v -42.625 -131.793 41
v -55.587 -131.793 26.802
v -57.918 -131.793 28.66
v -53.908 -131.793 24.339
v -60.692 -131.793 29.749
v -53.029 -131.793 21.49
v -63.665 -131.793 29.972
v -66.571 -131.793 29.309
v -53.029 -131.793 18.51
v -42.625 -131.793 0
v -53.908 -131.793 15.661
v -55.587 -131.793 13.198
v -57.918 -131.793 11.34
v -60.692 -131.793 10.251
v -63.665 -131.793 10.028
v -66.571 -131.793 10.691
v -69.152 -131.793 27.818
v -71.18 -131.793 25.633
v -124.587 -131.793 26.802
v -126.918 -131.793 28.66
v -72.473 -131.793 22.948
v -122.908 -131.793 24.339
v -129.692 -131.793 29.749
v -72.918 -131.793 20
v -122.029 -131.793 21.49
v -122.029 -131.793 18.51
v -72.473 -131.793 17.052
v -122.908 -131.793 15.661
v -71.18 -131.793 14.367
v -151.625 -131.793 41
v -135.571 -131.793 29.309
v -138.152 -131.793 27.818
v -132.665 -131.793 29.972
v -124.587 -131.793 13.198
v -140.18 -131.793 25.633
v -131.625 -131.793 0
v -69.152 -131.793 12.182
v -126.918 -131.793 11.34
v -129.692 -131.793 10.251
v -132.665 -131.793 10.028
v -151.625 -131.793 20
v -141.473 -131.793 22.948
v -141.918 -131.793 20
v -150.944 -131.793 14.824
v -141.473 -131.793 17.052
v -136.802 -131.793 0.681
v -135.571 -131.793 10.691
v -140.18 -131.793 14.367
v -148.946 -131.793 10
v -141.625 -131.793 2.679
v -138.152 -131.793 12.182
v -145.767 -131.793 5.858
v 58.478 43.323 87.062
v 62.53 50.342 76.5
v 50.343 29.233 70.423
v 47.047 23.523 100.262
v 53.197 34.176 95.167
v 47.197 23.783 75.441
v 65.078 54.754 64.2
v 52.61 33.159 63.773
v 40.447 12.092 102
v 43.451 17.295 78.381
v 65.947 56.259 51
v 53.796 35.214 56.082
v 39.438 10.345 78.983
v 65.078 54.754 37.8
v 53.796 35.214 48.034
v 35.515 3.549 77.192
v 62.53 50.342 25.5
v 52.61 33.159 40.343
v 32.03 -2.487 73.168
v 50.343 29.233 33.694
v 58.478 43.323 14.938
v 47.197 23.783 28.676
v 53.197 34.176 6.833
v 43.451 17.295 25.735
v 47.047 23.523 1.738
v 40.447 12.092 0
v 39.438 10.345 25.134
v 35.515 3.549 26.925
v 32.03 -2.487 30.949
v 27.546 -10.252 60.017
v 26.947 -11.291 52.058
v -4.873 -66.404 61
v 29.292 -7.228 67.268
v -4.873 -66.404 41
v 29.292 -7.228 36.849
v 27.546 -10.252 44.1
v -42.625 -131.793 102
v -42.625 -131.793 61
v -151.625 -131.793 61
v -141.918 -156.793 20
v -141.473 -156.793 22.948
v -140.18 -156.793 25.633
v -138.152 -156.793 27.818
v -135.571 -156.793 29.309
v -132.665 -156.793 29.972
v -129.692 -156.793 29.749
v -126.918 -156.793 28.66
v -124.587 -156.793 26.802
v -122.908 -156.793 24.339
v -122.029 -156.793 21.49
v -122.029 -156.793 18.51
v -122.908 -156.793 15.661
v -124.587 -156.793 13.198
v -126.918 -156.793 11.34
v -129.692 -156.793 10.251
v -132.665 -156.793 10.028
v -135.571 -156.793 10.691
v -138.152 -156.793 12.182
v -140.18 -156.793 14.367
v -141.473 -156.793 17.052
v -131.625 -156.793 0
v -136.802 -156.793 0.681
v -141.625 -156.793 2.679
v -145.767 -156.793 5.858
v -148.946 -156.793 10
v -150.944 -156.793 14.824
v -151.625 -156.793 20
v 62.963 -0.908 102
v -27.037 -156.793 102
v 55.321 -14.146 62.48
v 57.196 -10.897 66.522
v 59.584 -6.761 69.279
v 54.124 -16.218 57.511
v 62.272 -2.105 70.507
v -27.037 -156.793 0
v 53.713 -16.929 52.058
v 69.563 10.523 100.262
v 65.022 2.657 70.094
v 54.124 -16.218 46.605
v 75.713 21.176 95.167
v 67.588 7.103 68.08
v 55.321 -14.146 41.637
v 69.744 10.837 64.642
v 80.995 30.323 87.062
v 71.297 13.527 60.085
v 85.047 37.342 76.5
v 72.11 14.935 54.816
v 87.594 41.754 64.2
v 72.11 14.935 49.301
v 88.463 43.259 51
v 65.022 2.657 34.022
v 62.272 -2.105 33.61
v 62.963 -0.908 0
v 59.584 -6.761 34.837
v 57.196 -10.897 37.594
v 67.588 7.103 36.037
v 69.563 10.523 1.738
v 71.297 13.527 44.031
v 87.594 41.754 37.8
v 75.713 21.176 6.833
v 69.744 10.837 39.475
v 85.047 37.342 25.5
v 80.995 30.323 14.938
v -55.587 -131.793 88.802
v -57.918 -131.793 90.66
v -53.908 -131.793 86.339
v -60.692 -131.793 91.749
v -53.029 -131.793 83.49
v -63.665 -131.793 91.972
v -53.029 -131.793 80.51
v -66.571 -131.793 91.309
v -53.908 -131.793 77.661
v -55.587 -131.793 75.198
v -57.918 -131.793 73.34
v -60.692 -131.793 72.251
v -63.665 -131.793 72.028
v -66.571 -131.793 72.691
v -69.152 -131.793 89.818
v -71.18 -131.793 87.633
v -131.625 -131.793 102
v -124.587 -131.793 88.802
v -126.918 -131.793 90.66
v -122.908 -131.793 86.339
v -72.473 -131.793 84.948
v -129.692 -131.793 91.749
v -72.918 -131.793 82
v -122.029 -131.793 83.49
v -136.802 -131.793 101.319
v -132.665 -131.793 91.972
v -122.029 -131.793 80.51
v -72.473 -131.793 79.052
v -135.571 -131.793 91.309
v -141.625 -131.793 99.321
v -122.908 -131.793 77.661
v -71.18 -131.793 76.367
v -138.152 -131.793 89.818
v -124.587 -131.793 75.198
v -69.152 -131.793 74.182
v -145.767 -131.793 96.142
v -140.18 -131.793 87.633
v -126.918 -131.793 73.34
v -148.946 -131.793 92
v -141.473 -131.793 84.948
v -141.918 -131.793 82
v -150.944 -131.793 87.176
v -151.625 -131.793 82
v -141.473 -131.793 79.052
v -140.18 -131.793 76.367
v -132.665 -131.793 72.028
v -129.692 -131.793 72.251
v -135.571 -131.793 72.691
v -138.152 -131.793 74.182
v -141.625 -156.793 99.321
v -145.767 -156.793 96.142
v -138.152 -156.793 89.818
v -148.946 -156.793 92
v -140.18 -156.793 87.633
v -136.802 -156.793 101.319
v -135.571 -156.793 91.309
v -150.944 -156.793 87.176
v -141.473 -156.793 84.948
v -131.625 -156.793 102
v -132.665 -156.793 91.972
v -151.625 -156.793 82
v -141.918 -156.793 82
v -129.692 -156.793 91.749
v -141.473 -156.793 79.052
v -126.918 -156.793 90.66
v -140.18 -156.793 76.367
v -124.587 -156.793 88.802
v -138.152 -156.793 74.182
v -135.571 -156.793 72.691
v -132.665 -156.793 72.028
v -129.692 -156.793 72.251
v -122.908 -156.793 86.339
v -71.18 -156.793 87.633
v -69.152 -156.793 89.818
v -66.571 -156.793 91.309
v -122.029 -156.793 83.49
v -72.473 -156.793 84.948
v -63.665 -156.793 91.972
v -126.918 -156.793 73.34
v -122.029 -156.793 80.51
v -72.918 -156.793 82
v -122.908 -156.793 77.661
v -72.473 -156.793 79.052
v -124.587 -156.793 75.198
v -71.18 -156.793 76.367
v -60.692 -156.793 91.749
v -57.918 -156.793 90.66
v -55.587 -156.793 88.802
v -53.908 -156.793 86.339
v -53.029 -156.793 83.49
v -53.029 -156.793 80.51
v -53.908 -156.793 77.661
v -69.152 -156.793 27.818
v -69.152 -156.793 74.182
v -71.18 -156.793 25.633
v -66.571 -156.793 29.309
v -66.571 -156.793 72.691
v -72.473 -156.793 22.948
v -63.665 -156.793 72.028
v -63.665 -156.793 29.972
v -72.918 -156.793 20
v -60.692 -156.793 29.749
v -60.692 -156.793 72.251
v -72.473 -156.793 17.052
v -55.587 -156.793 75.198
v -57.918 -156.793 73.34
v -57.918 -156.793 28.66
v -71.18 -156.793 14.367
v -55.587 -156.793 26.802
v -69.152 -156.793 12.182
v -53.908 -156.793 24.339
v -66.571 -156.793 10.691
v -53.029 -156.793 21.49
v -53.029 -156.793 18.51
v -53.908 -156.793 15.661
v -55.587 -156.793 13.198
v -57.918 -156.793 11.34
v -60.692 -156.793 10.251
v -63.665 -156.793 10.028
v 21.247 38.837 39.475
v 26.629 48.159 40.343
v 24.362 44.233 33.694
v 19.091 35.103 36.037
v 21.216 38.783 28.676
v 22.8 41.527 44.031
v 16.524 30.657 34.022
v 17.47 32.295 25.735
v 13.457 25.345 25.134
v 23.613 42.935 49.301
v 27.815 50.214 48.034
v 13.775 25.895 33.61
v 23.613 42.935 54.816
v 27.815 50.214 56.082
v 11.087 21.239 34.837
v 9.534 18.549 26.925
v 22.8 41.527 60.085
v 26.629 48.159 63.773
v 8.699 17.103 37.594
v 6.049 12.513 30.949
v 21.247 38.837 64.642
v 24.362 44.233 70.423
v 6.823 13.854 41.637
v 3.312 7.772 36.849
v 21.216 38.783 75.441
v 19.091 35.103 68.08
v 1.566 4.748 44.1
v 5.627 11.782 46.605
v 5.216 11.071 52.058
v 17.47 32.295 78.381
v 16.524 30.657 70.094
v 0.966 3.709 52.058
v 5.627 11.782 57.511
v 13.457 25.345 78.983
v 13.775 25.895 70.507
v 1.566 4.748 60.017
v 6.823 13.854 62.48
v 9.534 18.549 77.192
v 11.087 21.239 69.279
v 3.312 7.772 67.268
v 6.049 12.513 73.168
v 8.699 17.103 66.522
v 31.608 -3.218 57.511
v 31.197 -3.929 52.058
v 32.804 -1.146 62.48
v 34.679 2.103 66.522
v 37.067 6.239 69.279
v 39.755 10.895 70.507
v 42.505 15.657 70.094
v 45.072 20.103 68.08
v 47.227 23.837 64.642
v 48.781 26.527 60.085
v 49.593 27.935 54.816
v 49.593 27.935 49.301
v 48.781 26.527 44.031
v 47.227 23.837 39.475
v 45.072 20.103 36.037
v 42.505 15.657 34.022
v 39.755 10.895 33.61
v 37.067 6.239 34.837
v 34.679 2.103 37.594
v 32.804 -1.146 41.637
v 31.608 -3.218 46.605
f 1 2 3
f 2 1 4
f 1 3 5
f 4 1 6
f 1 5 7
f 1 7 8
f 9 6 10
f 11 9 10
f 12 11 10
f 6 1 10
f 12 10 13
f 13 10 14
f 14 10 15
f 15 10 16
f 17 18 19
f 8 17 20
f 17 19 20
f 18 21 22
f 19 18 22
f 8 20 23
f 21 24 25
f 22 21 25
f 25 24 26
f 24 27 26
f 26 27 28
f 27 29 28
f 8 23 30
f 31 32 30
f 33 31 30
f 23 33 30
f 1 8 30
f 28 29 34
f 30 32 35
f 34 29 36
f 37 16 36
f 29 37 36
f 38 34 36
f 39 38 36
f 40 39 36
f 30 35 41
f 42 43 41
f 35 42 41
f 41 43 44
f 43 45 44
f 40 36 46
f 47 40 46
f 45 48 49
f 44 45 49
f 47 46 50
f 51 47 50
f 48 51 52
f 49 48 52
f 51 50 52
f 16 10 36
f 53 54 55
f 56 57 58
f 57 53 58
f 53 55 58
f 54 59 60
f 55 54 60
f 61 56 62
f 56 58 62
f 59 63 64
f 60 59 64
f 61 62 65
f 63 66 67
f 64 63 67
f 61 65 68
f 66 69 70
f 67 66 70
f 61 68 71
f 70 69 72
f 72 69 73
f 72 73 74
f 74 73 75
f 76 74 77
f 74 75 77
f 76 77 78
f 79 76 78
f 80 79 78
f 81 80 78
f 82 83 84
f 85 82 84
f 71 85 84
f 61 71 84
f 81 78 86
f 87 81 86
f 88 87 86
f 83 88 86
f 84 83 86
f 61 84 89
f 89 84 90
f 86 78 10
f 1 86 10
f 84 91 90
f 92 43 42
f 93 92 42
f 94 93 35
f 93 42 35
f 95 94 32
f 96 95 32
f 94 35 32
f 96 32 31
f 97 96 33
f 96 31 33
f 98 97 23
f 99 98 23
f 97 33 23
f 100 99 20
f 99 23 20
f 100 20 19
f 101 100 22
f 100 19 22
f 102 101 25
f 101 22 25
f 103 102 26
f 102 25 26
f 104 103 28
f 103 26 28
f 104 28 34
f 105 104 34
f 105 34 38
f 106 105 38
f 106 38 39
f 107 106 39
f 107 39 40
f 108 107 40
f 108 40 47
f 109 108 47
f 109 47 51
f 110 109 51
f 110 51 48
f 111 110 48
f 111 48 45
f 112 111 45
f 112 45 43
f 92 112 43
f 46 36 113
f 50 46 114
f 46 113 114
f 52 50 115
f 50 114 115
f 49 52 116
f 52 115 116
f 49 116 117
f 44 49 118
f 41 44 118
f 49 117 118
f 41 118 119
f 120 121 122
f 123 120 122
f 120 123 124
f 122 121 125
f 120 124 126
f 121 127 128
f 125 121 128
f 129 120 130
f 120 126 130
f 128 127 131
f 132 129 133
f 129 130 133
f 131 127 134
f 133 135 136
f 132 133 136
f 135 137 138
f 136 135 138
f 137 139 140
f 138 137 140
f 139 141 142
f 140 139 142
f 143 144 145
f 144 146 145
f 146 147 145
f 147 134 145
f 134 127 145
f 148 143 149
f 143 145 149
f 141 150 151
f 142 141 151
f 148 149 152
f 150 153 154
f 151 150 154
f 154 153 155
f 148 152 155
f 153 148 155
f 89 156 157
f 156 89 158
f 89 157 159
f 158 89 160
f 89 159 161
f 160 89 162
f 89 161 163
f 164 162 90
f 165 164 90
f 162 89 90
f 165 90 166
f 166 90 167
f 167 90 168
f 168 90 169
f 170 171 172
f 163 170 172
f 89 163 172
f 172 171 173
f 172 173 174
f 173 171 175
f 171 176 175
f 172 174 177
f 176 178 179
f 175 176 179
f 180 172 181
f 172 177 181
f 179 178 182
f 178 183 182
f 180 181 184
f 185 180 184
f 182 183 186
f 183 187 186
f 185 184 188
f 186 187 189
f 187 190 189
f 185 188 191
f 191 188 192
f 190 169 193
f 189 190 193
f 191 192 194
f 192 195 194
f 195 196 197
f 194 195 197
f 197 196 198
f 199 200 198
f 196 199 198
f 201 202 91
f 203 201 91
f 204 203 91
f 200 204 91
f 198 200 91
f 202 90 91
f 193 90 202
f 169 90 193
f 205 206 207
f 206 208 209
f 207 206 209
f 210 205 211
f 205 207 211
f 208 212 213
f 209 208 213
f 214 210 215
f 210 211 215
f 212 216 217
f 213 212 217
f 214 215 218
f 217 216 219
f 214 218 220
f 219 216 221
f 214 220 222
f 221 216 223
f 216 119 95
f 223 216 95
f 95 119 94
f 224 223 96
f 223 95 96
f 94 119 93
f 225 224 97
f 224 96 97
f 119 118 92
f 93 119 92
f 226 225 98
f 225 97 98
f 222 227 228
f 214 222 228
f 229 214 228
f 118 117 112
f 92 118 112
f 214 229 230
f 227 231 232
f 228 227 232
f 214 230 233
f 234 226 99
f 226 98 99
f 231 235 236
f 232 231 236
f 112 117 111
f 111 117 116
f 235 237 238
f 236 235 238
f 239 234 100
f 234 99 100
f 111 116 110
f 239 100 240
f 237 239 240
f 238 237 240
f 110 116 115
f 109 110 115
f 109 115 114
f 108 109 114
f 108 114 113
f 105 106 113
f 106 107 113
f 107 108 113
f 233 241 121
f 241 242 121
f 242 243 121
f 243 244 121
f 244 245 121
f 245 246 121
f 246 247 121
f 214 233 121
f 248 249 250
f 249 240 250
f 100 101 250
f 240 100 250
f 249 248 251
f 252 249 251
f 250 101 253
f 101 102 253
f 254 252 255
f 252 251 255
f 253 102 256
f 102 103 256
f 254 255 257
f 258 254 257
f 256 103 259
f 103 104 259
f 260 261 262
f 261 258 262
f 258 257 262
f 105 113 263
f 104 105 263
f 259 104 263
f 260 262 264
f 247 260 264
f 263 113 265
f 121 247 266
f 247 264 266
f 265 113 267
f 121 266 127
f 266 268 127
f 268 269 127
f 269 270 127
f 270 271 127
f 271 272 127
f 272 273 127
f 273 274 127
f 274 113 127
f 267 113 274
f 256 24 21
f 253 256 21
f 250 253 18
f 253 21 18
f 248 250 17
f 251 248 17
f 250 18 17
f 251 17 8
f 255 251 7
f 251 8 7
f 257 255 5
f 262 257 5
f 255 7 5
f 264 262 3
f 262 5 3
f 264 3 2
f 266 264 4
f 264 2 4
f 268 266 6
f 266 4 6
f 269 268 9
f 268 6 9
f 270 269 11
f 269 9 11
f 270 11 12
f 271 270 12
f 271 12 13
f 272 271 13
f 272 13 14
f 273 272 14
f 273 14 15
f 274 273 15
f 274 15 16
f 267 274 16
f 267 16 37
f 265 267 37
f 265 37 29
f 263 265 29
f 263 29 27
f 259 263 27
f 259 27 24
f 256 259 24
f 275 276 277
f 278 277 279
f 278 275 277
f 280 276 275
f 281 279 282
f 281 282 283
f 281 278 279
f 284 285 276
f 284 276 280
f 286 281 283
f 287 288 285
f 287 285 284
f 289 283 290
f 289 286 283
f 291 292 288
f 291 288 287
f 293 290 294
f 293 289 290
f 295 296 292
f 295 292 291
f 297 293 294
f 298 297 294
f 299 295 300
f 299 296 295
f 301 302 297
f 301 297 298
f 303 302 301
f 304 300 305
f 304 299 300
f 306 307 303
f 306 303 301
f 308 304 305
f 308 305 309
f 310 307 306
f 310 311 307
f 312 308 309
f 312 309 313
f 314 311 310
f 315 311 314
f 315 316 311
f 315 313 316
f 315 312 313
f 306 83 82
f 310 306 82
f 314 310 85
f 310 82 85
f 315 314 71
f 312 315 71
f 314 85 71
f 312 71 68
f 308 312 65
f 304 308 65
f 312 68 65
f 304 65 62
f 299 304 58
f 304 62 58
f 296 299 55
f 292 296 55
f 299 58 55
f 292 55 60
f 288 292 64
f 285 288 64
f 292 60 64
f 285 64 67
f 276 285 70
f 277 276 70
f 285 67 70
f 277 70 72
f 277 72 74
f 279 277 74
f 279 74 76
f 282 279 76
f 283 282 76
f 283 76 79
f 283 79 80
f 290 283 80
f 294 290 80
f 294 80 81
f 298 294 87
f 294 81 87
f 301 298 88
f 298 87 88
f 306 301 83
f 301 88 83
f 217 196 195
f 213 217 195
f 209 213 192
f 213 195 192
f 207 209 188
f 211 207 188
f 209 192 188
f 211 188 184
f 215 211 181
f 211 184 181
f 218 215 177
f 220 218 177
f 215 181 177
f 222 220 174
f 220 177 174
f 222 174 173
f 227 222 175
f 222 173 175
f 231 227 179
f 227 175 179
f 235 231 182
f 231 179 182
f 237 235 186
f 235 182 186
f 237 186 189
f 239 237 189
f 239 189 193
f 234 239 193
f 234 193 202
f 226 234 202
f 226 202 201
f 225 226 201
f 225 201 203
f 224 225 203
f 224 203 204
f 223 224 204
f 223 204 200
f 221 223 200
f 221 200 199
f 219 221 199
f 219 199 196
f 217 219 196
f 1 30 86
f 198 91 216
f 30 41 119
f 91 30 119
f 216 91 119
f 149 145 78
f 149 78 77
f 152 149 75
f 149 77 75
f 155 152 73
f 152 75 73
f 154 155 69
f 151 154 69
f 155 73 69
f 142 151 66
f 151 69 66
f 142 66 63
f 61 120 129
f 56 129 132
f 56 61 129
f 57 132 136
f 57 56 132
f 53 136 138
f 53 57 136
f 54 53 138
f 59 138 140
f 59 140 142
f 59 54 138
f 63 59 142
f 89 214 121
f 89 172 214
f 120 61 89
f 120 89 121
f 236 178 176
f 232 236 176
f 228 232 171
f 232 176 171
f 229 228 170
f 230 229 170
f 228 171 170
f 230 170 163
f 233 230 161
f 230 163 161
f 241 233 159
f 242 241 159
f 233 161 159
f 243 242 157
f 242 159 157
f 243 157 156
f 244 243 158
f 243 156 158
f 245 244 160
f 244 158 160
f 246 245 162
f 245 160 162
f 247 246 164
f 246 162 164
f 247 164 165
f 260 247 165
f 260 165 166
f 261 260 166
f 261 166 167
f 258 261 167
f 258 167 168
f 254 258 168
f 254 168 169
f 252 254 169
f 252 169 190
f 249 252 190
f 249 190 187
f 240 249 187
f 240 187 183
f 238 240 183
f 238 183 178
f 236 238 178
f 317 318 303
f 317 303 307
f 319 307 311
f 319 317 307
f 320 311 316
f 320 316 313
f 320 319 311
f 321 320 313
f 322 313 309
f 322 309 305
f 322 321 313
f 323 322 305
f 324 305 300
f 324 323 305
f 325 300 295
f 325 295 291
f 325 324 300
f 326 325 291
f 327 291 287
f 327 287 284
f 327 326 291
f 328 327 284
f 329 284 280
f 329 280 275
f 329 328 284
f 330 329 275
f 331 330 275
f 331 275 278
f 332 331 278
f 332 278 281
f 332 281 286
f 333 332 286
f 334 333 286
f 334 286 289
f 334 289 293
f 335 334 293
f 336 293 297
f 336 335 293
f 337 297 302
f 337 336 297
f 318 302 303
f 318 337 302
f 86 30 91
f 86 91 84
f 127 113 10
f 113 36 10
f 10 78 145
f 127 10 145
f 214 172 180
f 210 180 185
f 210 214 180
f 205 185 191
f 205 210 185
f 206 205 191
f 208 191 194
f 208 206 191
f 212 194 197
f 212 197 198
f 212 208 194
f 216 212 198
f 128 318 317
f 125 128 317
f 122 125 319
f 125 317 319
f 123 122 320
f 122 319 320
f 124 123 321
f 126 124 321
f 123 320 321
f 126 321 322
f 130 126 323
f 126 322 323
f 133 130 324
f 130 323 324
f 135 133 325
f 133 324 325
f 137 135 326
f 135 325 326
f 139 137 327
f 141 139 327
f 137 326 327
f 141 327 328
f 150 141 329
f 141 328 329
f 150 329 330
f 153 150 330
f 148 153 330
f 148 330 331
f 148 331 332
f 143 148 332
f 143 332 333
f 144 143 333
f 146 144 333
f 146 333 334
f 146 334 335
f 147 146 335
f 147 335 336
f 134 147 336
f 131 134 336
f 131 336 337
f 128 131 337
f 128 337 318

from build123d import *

# Parameters (mm, degrees)
F1_DEPTH  = 102
F2_R      = 27
F2_R_2    = 18.5
F3_DEPTH  = 30
F4_R      = 10
F5_DEPTH  = 50
F6_R      = 50.99999
F9_DEPTH  = 10
F10_R     = 18.5
F11_DEPTH = 30
F12_R     = 20


# Not quite as in the source:
# - a fillet or chamfer is up to 0.001 mm smaller than in the source, because OpenCascade refuses the exact size


with BuildPart() as f1:
    # F0 (on Top) → F1 (new body)
    with BuildSketch(Plane.XY):
        Polygon((-151.6251202653, -131.7925444834), (-151.6251202653, -156.7925444834), (-27.0366629971, -156.7925444834), (88.4633370029, 43.2593237909), (65.9466765045, 56.2593237909), (-42.6251202653, -131.7925444834), align=None)
    extrude(amount=F1_DEPTH)

    # F2 (on face) → F3 (join)
    with BuildSketch(Plane(origin=(25.099005577, -14.4909176263, 0), x_dir=(-0.5, -0.8660254038, 0), z_dir=(-0.8660254038, 0.5, 0))):
        with Locations((-30.6953418548, 52.0583279431)):
            Circle(F2_R)
        with Locations((-30.6953418548, 52.0583279431)):
            Circle(F2_R_2, mode=Mode.SUBTRACT)
    extrude(amount=F3_DEPTH)

    # F4 (on face) → F5 (cut)
    with BuildSketch(Plane(origin=(0, -131.7925444834, 0), x_dir=(-1, 0, 0), z_dir=(0, 1, 0))):
        with Locations((62.9175528884, 82)):
            Circle(F4_R)
        with Locations((131.9175528884, 82)):
            Circle(F4_R)
        with Locations((131.9175528884, 20)):
            Circle(F4_R)
        with Locations((62.9175528884, 20)):
            Circle(F4_R)
    extrude(amount=-F5_DEPTH, mode=Mode.SUBTRACT)

    # F6 (radius 51 in the source; OpenCascade refuses exactly that, so slightly less here)
    f6_edges = [f1.edges().sort_by_distance(p)[0] for p in [
        (77.205007, 49.759324, 102),
        (77.205007, 49.759324, 0),
    ]]
    fillet(f6_edges, radius=F6_R)

    # F8 (on offset) → F9 (join, symmetric)
    with BuildSketch(Plane(origin=(0, 0, 51), x_dir=(1, 0, 0), z_dir=(0, 0, -1))):
        Polygon((-42.6251202653, 131.7925444834), (-151.6251202653, 131.7925444834), (-4.3144722301, 66.1549466668), align=None)
    extrude(amount=F9_DEPTH, both=True)

    # F10 (on face) → F11 (cut)
    with BuildSketch(Plane(origin=(25.099005577, -14.4909176263, 0), x_dir=(-0.5, -0.8660254038, 0), z_dir=(-0.8660254038, 0.5, 0))):
        with Locations((-30.6953418548, 52.0583279431)):
            Circle(F10_R)
    extrude(amount=-F11_DEPTH, mode=Mode.SUBTRACT)

    # F12
    f12_edges = [f1.edges().sort_by_distance(p)[0] for p in [
        (-151.62512, -144.292544, 102),
        (-151.62512, -144.292544, 0),
    ]]
    fillet(f12_edges, radius=F12_R)


solid = f1.part
